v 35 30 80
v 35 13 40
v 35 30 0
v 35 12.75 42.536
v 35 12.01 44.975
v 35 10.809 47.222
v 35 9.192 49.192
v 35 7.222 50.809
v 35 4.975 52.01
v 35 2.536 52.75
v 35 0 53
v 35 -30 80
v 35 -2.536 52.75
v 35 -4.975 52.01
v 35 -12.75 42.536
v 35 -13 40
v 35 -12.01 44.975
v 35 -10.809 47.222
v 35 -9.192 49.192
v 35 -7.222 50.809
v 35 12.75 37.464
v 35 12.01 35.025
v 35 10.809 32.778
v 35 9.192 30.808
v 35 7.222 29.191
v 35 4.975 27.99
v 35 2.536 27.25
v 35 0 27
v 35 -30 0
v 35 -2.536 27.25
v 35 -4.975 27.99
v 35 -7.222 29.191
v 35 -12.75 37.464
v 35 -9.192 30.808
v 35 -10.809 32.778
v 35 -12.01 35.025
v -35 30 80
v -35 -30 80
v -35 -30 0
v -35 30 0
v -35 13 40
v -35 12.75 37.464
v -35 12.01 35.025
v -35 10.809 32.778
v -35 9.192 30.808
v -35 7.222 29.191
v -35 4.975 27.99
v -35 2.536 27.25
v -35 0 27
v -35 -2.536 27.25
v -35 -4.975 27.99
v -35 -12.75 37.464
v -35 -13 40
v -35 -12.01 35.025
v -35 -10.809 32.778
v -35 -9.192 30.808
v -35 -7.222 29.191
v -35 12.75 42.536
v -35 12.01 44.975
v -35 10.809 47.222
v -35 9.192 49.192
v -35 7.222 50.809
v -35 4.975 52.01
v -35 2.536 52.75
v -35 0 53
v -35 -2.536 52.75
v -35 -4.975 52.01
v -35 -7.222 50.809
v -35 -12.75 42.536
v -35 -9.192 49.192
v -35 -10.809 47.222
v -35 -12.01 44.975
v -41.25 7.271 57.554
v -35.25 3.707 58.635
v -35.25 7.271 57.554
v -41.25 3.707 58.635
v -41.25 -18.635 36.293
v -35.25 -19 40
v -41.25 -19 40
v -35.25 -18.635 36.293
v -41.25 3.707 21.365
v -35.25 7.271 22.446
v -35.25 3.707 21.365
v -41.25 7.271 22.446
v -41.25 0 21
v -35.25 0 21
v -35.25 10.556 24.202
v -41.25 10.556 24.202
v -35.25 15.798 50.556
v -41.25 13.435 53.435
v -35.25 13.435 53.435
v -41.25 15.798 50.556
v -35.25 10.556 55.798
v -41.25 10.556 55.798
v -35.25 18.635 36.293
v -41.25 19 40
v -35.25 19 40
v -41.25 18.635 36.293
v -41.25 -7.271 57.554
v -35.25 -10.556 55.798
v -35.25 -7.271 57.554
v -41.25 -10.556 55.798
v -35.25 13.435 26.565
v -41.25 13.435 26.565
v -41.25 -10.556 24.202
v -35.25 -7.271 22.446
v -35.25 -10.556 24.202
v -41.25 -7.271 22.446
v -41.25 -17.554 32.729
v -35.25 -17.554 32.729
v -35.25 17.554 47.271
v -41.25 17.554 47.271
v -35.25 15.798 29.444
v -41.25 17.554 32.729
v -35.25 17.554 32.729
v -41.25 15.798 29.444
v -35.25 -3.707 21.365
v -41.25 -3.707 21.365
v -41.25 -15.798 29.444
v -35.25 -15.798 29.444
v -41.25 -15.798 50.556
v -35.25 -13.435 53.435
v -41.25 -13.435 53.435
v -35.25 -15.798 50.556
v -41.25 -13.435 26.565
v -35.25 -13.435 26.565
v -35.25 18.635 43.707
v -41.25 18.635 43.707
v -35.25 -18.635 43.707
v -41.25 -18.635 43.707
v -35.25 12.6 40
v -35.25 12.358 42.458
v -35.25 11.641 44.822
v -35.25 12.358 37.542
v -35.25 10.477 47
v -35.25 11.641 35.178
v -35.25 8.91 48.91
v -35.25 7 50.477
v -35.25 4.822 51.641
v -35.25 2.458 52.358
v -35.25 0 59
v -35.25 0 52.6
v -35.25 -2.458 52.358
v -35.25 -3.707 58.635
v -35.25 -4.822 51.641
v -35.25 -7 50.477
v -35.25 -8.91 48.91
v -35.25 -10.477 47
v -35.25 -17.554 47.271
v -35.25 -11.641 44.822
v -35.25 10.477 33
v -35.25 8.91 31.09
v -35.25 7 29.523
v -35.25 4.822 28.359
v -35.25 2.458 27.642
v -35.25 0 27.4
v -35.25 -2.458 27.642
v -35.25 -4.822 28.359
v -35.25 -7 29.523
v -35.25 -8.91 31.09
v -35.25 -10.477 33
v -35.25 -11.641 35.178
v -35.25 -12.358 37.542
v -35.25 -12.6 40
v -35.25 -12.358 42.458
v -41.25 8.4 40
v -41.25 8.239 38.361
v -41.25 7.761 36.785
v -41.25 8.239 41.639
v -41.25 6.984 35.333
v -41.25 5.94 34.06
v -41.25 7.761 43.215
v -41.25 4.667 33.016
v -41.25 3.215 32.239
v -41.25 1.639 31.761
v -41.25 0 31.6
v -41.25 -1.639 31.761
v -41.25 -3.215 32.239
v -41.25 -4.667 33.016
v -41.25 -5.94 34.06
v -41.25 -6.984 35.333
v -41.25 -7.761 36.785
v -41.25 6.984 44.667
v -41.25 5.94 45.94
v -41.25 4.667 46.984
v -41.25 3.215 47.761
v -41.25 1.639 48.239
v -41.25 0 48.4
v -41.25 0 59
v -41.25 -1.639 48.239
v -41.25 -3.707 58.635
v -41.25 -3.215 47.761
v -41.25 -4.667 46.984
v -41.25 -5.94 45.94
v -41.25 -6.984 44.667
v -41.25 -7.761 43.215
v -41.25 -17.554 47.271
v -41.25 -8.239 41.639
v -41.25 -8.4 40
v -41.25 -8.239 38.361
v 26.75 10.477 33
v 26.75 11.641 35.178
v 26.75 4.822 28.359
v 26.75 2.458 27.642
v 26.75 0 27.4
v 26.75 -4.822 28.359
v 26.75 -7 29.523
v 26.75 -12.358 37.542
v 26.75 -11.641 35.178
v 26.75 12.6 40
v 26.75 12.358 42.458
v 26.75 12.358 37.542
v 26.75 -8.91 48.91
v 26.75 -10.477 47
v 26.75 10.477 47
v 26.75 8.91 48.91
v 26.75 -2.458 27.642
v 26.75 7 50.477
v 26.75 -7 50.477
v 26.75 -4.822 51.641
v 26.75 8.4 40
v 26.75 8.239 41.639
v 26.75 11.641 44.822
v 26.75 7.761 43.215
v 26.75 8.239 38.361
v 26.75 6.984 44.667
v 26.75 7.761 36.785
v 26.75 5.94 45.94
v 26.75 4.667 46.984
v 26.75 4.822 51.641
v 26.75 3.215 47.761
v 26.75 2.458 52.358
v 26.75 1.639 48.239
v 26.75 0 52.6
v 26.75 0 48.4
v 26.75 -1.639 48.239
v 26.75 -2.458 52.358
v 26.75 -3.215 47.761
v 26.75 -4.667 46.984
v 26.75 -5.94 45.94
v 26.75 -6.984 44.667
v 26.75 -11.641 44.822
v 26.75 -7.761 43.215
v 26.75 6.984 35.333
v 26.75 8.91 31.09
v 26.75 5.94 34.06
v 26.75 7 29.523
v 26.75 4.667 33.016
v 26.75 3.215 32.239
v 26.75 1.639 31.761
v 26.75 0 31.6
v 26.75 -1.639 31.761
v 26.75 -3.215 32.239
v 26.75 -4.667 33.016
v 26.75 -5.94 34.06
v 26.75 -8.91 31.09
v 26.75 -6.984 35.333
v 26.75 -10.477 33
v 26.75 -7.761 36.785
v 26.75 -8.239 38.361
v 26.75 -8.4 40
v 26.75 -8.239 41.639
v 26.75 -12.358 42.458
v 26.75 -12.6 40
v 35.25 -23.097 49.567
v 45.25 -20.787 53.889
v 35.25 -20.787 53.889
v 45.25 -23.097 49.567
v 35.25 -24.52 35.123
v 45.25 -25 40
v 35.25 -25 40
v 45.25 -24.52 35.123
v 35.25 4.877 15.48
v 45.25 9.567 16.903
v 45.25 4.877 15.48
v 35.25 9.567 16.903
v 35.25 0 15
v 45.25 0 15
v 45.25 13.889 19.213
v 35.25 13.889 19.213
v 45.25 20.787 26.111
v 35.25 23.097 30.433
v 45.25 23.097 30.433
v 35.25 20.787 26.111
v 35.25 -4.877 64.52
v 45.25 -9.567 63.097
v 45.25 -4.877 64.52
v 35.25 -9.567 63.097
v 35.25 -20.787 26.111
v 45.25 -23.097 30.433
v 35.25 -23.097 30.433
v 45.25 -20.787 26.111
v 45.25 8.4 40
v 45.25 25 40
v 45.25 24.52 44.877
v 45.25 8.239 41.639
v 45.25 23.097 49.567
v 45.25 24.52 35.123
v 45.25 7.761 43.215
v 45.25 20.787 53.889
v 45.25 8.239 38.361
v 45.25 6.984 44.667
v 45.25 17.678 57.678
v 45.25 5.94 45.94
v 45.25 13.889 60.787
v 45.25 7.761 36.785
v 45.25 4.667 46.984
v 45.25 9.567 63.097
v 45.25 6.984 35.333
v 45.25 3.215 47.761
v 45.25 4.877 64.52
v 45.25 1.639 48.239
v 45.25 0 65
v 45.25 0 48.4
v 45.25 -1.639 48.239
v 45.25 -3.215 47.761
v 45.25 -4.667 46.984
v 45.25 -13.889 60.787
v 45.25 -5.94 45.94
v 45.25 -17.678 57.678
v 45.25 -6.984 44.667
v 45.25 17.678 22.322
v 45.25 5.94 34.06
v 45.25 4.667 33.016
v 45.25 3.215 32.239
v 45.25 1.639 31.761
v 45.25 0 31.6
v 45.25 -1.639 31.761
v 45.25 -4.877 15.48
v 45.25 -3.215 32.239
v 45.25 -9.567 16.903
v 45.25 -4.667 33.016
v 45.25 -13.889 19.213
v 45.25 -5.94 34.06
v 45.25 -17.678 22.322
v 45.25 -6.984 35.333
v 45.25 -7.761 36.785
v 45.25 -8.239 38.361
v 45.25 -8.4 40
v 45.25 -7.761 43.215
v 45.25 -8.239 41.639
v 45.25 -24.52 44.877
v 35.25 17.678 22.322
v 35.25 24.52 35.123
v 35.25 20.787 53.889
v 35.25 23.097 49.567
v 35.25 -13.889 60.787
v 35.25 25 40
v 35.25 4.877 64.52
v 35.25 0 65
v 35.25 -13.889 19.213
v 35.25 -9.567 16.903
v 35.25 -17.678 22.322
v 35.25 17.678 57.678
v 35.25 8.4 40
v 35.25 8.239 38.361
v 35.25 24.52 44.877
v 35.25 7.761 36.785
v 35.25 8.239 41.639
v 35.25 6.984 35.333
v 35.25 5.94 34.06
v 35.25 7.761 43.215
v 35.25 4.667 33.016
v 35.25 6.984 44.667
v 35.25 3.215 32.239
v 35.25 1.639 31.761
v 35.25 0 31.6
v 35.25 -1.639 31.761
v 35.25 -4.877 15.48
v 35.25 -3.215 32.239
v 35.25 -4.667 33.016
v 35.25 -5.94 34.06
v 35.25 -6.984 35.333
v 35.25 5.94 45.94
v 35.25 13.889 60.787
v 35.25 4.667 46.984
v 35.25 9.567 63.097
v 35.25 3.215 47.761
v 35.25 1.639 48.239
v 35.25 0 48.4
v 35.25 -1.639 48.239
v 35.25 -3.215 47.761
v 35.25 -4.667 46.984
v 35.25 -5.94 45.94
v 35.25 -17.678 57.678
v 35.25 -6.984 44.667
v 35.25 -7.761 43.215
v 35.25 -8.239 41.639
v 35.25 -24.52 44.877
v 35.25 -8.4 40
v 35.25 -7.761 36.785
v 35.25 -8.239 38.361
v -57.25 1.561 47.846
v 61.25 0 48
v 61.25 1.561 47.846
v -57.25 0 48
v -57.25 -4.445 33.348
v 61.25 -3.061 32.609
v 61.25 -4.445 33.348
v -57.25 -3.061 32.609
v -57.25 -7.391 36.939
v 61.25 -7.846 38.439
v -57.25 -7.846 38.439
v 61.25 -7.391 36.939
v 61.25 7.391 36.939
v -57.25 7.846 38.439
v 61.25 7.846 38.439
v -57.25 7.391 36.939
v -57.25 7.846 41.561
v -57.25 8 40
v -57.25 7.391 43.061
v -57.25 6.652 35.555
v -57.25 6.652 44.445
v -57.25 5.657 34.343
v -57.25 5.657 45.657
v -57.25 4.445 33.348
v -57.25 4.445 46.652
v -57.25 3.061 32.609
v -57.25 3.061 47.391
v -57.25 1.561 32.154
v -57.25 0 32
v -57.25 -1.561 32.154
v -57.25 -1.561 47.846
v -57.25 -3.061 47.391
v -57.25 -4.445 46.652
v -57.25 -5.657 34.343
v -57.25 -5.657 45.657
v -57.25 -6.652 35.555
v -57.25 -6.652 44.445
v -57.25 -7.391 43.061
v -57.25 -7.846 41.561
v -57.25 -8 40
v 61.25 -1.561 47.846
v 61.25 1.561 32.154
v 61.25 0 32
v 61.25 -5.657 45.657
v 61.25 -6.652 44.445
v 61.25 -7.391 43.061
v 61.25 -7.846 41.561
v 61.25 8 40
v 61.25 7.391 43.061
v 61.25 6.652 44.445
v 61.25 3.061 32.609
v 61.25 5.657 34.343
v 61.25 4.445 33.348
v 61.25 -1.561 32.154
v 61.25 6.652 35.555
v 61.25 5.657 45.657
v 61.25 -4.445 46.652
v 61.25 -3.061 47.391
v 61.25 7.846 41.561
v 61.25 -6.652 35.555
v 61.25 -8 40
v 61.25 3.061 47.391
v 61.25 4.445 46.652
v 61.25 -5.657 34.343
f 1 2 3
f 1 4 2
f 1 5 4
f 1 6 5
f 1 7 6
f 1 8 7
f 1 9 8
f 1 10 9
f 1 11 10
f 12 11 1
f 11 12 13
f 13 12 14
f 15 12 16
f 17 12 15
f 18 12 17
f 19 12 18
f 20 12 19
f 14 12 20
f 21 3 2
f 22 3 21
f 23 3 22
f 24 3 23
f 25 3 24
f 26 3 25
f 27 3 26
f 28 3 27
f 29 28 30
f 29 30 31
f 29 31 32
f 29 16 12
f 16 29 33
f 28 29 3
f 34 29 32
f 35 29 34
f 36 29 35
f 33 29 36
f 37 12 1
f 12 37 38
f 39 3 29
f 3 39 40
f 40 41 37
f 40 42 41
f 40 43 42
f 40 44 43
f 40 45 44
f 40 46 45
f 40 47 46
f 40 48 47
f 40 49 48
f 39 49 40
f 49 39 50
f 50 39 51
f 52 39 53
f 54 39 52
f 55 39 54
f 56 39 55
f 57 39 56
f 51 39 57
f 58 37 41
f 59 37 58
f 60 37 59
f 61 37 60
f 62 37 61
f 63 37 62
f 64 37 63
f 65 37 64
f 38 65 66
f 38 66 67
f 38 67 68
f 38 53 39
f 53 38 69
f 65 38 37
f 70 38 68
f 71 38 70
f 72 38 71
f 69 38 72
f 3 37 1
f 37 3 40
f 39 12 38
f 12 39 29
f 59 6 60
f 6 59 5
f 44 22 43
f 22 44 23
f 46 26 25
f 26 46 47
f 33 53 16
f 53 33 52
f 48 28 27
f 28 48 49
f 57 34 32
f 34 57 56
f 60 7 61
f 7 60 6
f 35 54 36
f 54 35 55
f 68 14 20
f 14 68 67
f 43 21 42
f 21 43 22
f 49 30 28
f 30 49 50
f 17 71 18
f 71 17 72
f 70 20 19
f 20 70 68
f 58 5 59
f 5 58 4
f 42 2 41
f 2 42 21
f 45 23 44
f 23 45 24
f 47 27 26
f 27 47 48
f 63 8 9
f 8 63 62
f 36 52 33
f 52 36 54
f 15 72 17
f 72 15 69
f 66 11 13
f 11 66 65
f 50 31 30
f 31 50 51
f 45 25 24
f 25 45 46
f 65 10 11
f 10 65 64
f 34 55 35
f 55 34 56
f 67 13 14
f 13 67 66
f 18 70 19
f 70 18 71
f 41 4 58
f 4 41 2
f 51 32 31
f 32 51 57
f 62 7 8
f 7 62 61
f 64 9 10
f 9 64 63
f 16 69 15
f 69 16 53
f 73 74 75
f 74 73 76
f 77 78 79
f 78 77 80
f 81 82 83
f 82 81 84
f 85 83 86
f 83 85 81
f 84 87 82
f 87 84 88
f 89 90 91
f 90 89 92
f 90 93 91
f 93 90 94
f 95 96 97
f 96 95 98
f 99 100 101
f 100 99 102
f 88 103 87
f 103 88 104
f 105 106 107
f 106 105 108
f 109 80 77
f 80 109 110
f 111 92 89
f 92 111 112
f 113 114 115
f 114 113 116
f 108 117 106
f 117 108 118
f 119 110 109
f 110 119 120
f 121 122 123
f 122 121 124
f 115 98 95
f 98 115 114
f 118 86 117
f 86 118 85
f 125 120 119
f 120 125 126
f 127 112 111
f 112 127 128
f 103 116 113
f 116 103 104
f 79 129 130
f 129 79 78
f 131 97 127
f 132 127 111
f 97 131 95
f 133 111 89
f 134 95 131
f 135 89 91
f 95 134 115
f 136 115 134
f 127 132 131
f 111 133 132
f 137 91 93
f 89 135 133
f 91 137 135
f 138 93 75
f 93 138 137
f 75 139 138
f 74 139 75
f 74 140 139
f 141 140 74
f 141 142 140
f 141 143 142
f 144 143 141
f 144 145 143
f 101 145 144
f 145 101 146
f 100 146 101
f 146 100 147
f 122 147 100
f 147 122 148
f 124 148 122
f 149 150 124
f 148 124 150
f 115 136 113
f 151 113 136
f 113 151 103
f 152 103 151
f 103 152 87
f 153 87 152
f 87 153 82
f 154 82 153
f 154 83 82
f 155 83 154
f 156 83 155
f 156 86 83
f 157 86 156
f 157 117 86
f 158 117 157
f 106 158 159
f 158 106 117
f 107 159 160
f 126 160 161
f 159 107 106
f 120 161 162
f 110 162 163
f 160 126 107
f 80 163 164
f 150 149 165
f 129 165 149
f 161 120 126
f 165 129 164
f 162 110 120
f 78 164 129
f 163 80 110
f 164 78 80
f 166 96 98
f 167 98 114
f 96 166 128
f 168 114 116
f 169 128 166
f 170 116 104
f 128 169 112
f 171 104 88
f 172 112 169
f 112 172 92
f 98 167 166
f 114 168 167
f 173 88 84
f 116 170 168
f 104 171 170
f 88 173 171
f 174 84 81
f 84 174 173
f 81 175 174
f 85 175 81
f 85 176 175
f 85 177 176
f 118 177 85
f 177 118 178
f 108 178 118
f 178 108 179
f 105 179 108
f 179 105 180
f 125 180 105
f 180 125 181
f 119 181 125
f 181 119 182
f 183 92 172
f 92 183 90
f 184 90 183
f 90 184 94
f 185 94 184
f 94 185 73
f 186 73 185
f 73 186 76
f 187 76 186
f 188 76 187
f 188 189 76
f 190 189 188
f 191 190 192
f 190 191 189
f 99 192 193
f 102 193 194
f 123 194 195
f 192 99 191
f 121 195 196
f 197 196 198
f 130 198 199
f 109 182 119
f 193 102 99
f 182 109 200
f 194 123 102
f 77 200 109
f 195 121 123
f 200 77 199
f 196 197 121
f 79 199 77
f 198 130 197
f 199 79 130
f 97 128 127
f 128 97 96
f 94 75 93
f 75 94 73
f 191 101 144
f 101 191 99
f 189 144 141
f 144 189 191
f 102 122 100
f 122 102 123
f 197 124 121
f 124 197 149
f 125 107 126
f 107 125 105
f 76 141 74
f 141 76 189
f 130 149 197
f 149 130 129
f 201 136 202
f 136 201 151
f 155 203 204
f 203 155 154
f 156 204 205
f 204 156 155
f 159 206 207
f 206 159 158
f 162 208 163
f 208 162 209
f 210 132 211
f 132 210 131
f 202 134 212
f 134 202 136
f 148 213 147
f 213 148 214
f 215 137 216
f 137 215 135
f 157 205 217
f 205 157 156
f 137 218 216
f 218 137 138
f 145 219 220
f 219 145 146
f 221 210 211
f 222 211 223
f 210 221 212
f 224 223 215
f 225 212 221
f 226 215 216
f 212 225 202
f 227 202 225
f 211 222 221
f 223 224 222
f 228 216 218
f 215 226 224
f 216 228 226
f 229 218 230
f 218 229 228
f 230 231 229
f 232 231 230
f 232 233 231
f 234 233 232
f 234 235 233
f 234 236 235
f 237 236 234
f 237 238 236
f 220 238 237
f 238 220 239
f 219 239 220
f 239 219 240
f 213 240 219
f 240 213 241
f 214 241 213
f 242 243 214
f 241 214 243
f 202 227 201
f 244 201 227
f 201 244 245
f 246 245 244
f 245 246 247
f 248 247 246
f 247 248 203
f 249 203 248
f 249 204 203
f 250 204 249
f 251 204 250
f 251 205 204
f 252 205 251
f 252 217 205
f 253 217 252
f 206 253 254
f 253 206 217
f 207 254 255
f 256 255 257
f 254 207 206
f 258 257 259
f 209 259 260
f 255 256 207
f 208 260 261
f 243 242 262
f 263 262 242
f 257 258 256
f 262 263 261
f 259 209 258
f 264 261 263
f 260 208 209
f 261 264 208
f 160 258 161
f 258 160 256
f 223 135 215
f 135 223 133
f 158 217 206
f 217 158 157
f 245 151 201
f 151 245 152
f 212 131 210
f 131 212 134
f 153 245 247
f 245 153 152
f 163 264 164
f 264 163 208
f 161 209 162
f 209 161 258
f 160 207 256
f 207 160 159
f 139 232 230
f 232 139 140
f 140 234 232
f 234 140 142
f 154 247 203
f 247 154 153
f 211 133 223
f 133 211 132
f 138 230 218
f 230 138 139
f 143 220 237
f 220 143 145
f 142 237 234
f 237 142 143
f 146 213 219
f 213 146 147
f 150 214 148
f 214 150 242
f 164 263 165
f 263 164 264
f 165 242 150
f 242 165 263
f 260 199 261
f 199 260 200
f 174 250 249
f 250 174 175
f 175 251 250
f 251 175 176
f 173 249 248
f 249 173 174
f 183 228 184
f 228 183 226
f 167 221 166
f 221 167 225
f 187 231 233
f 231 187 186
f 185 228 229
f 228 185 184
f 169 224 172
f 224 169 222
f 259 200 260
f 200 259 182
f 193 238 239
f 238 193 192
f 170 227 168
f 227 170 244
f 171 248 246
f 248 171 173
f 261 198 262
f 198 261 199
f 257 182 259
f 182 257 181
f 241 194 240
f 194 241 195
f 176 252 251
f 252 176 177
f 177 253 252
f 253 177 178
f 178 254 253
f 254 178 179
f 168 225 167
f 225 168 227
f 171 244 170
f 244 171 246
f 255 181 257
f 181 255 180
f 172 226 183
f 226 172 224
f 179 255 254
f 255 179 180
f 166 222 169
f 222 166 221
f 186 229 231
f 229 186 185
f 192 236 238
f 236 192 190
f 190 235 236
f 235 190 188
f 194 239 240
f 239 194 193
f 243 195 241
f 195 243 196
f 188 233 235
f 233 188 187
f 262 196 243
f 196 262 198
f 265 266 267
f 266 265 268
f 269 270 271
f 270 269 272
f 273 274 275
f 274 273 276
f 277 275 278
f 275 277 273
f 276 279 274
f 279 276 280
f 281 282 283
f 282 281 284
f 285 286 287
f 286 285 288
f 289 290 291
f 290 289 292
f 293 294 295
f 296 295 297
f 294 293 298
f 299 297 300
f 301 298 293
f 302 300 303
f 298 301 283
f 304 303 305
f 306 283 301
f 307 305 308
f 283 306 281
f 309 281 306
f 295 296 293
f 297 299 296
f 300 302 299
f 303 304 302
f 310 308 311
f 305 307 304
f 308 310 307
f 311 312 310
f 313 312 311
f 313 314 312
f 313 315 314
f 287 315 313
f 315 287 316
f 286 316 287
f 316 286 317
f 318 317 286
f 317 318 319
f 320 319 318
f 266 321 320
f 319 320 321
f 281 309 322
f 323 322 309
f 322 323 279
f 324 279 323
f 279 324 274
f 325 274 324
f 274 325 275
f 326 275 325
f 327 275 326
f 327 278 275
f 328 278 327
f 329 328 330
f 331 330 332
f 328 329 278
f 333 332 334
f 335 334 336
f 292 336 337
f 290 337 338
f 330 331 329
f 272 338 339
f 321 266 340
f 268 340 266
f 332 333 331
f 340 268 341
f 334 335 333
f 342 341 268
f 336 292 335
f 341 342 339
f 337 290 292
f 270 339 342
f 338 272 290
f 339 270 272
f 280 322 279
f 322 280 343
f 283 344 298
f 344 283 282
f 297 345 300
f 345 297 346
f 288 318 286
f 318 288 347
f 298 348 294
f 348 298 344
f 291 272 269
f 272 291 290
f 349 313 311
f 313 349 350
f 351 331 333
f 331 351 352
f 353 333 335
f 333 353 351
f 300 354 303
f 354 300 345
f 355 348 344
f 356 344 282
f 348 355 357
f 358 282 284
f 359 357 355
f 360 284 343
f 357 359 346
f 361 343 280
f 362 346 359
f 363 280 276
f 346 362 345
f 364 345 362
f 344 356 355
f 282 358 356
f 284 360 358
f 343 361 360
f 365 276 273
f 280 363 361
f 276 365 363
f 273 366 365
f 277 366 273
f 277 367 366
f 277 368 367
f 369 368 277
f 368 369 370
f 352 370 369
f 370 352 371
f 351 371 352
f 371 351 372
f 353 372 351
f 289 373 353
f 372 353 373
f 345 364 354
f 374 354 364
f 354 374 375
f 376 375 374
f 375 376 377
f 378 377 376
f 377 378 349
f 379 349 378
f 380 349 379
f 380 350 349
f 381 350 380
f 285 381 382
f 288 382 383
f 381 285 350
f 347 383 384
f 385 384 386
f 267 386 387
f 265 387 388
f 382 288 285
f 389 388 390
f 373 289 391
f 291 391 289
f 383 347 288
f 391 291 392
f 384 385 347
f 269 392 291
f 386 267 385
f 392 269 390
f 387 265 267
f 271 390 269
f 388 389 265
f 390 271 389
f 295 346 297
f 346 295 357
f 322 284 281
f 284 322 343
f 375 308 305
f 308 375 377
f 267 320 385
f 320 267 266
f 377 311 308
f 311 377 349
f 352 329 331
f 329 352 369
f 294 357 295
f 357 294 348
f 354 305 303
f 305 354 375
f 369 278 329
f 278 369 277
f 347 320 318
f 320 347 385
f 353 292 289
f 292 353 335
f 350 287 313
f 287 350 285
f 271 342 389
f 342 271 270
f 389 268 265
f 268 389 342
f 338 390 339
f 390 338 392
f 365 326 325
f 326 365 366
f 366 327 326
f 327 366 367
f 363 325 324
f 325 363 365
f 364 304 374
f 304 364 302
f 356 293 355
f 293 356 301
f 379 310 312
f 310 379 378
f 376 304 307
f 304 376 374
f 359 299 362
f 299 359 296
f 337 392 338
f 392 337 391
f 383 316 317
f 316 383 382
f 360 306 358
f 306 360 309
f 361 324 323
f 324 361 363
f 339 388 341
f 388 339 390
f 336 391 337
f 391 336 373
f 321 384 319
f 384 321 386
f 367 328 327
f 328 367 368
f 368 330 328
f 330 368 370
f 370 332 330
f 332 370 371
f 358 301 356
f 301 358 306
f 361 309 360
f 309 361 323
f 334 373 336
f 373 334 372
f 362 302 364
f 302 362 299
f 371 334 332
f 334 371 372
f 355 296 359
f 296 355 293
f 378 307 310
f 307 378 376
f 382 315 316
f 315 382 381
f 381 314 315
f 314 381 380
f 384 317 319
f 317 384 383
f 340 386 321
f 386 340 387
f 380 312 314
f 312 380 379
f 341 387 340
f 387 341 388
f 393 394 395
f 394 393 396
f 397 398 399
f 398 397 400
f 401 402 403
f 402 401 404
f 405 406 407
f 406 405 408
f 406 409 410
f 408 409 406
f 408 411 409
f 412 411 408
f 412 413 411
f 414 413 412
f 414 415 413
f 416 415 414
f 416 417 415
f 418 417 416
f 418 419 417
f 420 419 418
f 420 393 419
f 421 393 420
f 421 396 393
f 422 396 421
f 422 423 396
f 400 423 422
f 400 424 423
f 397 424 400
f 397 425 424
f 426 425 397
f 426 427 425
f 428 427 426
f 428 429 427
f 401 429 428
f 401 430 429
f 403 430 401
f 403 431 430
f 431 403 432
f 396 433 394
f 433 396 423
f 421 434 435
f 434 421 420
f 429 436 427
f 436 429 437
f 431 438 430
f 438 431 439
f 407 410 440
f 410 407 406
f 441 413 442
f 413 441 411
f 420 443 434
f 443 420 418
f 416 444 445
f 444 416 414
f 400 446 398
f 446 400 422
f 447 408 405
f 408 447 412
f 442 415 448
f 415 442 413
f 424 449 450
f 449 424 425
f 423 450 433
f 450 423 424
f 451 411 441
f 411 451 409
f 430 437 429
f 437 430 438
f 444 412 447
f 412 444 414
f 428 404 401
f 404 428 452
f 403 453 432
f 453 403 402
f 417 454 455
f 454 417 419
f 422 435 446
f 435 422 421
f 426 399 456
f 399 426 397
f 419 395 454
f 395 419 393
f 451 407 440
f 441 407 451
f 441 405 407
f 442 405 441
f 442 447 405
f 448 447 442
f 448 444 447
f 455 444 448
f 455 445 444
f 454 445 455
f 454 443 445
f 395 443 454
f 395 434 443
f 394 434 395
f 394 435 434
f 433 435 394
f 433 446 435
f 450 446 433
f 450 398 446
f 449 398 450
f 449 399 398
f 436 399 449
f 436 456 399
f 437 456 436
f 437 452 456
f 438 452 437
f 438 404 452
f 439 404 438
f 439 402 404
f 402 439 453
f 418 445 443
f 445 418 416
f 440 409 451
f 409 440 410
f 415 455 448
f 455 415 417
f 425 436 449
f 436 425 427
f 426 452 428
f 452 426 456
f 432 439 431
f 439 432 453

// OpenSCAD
$fn = 32;

// ------------------------------------------------------------------------
// Bushed housing: 70 x 60 x 80 mm housing, bushing d25.2
// Every part is its own module, assembly() places them once.
// ------------------------------------------------------------------------

// --- part 1 ---
module housing() {
  difference() {
    translate([-35, -30, 0]) cube([70, 60, 80]);
    translate([0, 0, 40]) rotate([0, 90, 0]) cylinder(h = 72, d = 26, center = true);
  }
}

// --- part 2 ---
module bushing() {
  difference() {
    union() {
      cylinder(h = 6, d = 38);
      translate([0, 0, 6]) cylinder(h = 62, d = 25.2);
    }
    translate([0, 0, -1]) cylinder(h = 70, d = 16.8);
  }
}

// --- part 3 ---
module shaft() {
  translate([0, 0, -59.25]) cylinder(h = 118.5, d = 16);
}

// --- part 4 ---
module cover() {
  difference() {
    cylinder(h = 10, d = 50);
    translate([0, 0, -1]) cylinder(h = 12, d = 16.8);
  }
}

// --- assembly ---
module assembly() {
  translate([0, 0, 0]) rotate([0, 0, 0]) housing();
  translate([-41.25, 0, 40]) rotate([0, 90, 0]) bushing();
  translate([2, 0, 40]) rotate([0, 90, 0]) shaft();
  translate([35.25, 0, 40]) rotate([0, 90, 0]) cover();
}

assembly();
